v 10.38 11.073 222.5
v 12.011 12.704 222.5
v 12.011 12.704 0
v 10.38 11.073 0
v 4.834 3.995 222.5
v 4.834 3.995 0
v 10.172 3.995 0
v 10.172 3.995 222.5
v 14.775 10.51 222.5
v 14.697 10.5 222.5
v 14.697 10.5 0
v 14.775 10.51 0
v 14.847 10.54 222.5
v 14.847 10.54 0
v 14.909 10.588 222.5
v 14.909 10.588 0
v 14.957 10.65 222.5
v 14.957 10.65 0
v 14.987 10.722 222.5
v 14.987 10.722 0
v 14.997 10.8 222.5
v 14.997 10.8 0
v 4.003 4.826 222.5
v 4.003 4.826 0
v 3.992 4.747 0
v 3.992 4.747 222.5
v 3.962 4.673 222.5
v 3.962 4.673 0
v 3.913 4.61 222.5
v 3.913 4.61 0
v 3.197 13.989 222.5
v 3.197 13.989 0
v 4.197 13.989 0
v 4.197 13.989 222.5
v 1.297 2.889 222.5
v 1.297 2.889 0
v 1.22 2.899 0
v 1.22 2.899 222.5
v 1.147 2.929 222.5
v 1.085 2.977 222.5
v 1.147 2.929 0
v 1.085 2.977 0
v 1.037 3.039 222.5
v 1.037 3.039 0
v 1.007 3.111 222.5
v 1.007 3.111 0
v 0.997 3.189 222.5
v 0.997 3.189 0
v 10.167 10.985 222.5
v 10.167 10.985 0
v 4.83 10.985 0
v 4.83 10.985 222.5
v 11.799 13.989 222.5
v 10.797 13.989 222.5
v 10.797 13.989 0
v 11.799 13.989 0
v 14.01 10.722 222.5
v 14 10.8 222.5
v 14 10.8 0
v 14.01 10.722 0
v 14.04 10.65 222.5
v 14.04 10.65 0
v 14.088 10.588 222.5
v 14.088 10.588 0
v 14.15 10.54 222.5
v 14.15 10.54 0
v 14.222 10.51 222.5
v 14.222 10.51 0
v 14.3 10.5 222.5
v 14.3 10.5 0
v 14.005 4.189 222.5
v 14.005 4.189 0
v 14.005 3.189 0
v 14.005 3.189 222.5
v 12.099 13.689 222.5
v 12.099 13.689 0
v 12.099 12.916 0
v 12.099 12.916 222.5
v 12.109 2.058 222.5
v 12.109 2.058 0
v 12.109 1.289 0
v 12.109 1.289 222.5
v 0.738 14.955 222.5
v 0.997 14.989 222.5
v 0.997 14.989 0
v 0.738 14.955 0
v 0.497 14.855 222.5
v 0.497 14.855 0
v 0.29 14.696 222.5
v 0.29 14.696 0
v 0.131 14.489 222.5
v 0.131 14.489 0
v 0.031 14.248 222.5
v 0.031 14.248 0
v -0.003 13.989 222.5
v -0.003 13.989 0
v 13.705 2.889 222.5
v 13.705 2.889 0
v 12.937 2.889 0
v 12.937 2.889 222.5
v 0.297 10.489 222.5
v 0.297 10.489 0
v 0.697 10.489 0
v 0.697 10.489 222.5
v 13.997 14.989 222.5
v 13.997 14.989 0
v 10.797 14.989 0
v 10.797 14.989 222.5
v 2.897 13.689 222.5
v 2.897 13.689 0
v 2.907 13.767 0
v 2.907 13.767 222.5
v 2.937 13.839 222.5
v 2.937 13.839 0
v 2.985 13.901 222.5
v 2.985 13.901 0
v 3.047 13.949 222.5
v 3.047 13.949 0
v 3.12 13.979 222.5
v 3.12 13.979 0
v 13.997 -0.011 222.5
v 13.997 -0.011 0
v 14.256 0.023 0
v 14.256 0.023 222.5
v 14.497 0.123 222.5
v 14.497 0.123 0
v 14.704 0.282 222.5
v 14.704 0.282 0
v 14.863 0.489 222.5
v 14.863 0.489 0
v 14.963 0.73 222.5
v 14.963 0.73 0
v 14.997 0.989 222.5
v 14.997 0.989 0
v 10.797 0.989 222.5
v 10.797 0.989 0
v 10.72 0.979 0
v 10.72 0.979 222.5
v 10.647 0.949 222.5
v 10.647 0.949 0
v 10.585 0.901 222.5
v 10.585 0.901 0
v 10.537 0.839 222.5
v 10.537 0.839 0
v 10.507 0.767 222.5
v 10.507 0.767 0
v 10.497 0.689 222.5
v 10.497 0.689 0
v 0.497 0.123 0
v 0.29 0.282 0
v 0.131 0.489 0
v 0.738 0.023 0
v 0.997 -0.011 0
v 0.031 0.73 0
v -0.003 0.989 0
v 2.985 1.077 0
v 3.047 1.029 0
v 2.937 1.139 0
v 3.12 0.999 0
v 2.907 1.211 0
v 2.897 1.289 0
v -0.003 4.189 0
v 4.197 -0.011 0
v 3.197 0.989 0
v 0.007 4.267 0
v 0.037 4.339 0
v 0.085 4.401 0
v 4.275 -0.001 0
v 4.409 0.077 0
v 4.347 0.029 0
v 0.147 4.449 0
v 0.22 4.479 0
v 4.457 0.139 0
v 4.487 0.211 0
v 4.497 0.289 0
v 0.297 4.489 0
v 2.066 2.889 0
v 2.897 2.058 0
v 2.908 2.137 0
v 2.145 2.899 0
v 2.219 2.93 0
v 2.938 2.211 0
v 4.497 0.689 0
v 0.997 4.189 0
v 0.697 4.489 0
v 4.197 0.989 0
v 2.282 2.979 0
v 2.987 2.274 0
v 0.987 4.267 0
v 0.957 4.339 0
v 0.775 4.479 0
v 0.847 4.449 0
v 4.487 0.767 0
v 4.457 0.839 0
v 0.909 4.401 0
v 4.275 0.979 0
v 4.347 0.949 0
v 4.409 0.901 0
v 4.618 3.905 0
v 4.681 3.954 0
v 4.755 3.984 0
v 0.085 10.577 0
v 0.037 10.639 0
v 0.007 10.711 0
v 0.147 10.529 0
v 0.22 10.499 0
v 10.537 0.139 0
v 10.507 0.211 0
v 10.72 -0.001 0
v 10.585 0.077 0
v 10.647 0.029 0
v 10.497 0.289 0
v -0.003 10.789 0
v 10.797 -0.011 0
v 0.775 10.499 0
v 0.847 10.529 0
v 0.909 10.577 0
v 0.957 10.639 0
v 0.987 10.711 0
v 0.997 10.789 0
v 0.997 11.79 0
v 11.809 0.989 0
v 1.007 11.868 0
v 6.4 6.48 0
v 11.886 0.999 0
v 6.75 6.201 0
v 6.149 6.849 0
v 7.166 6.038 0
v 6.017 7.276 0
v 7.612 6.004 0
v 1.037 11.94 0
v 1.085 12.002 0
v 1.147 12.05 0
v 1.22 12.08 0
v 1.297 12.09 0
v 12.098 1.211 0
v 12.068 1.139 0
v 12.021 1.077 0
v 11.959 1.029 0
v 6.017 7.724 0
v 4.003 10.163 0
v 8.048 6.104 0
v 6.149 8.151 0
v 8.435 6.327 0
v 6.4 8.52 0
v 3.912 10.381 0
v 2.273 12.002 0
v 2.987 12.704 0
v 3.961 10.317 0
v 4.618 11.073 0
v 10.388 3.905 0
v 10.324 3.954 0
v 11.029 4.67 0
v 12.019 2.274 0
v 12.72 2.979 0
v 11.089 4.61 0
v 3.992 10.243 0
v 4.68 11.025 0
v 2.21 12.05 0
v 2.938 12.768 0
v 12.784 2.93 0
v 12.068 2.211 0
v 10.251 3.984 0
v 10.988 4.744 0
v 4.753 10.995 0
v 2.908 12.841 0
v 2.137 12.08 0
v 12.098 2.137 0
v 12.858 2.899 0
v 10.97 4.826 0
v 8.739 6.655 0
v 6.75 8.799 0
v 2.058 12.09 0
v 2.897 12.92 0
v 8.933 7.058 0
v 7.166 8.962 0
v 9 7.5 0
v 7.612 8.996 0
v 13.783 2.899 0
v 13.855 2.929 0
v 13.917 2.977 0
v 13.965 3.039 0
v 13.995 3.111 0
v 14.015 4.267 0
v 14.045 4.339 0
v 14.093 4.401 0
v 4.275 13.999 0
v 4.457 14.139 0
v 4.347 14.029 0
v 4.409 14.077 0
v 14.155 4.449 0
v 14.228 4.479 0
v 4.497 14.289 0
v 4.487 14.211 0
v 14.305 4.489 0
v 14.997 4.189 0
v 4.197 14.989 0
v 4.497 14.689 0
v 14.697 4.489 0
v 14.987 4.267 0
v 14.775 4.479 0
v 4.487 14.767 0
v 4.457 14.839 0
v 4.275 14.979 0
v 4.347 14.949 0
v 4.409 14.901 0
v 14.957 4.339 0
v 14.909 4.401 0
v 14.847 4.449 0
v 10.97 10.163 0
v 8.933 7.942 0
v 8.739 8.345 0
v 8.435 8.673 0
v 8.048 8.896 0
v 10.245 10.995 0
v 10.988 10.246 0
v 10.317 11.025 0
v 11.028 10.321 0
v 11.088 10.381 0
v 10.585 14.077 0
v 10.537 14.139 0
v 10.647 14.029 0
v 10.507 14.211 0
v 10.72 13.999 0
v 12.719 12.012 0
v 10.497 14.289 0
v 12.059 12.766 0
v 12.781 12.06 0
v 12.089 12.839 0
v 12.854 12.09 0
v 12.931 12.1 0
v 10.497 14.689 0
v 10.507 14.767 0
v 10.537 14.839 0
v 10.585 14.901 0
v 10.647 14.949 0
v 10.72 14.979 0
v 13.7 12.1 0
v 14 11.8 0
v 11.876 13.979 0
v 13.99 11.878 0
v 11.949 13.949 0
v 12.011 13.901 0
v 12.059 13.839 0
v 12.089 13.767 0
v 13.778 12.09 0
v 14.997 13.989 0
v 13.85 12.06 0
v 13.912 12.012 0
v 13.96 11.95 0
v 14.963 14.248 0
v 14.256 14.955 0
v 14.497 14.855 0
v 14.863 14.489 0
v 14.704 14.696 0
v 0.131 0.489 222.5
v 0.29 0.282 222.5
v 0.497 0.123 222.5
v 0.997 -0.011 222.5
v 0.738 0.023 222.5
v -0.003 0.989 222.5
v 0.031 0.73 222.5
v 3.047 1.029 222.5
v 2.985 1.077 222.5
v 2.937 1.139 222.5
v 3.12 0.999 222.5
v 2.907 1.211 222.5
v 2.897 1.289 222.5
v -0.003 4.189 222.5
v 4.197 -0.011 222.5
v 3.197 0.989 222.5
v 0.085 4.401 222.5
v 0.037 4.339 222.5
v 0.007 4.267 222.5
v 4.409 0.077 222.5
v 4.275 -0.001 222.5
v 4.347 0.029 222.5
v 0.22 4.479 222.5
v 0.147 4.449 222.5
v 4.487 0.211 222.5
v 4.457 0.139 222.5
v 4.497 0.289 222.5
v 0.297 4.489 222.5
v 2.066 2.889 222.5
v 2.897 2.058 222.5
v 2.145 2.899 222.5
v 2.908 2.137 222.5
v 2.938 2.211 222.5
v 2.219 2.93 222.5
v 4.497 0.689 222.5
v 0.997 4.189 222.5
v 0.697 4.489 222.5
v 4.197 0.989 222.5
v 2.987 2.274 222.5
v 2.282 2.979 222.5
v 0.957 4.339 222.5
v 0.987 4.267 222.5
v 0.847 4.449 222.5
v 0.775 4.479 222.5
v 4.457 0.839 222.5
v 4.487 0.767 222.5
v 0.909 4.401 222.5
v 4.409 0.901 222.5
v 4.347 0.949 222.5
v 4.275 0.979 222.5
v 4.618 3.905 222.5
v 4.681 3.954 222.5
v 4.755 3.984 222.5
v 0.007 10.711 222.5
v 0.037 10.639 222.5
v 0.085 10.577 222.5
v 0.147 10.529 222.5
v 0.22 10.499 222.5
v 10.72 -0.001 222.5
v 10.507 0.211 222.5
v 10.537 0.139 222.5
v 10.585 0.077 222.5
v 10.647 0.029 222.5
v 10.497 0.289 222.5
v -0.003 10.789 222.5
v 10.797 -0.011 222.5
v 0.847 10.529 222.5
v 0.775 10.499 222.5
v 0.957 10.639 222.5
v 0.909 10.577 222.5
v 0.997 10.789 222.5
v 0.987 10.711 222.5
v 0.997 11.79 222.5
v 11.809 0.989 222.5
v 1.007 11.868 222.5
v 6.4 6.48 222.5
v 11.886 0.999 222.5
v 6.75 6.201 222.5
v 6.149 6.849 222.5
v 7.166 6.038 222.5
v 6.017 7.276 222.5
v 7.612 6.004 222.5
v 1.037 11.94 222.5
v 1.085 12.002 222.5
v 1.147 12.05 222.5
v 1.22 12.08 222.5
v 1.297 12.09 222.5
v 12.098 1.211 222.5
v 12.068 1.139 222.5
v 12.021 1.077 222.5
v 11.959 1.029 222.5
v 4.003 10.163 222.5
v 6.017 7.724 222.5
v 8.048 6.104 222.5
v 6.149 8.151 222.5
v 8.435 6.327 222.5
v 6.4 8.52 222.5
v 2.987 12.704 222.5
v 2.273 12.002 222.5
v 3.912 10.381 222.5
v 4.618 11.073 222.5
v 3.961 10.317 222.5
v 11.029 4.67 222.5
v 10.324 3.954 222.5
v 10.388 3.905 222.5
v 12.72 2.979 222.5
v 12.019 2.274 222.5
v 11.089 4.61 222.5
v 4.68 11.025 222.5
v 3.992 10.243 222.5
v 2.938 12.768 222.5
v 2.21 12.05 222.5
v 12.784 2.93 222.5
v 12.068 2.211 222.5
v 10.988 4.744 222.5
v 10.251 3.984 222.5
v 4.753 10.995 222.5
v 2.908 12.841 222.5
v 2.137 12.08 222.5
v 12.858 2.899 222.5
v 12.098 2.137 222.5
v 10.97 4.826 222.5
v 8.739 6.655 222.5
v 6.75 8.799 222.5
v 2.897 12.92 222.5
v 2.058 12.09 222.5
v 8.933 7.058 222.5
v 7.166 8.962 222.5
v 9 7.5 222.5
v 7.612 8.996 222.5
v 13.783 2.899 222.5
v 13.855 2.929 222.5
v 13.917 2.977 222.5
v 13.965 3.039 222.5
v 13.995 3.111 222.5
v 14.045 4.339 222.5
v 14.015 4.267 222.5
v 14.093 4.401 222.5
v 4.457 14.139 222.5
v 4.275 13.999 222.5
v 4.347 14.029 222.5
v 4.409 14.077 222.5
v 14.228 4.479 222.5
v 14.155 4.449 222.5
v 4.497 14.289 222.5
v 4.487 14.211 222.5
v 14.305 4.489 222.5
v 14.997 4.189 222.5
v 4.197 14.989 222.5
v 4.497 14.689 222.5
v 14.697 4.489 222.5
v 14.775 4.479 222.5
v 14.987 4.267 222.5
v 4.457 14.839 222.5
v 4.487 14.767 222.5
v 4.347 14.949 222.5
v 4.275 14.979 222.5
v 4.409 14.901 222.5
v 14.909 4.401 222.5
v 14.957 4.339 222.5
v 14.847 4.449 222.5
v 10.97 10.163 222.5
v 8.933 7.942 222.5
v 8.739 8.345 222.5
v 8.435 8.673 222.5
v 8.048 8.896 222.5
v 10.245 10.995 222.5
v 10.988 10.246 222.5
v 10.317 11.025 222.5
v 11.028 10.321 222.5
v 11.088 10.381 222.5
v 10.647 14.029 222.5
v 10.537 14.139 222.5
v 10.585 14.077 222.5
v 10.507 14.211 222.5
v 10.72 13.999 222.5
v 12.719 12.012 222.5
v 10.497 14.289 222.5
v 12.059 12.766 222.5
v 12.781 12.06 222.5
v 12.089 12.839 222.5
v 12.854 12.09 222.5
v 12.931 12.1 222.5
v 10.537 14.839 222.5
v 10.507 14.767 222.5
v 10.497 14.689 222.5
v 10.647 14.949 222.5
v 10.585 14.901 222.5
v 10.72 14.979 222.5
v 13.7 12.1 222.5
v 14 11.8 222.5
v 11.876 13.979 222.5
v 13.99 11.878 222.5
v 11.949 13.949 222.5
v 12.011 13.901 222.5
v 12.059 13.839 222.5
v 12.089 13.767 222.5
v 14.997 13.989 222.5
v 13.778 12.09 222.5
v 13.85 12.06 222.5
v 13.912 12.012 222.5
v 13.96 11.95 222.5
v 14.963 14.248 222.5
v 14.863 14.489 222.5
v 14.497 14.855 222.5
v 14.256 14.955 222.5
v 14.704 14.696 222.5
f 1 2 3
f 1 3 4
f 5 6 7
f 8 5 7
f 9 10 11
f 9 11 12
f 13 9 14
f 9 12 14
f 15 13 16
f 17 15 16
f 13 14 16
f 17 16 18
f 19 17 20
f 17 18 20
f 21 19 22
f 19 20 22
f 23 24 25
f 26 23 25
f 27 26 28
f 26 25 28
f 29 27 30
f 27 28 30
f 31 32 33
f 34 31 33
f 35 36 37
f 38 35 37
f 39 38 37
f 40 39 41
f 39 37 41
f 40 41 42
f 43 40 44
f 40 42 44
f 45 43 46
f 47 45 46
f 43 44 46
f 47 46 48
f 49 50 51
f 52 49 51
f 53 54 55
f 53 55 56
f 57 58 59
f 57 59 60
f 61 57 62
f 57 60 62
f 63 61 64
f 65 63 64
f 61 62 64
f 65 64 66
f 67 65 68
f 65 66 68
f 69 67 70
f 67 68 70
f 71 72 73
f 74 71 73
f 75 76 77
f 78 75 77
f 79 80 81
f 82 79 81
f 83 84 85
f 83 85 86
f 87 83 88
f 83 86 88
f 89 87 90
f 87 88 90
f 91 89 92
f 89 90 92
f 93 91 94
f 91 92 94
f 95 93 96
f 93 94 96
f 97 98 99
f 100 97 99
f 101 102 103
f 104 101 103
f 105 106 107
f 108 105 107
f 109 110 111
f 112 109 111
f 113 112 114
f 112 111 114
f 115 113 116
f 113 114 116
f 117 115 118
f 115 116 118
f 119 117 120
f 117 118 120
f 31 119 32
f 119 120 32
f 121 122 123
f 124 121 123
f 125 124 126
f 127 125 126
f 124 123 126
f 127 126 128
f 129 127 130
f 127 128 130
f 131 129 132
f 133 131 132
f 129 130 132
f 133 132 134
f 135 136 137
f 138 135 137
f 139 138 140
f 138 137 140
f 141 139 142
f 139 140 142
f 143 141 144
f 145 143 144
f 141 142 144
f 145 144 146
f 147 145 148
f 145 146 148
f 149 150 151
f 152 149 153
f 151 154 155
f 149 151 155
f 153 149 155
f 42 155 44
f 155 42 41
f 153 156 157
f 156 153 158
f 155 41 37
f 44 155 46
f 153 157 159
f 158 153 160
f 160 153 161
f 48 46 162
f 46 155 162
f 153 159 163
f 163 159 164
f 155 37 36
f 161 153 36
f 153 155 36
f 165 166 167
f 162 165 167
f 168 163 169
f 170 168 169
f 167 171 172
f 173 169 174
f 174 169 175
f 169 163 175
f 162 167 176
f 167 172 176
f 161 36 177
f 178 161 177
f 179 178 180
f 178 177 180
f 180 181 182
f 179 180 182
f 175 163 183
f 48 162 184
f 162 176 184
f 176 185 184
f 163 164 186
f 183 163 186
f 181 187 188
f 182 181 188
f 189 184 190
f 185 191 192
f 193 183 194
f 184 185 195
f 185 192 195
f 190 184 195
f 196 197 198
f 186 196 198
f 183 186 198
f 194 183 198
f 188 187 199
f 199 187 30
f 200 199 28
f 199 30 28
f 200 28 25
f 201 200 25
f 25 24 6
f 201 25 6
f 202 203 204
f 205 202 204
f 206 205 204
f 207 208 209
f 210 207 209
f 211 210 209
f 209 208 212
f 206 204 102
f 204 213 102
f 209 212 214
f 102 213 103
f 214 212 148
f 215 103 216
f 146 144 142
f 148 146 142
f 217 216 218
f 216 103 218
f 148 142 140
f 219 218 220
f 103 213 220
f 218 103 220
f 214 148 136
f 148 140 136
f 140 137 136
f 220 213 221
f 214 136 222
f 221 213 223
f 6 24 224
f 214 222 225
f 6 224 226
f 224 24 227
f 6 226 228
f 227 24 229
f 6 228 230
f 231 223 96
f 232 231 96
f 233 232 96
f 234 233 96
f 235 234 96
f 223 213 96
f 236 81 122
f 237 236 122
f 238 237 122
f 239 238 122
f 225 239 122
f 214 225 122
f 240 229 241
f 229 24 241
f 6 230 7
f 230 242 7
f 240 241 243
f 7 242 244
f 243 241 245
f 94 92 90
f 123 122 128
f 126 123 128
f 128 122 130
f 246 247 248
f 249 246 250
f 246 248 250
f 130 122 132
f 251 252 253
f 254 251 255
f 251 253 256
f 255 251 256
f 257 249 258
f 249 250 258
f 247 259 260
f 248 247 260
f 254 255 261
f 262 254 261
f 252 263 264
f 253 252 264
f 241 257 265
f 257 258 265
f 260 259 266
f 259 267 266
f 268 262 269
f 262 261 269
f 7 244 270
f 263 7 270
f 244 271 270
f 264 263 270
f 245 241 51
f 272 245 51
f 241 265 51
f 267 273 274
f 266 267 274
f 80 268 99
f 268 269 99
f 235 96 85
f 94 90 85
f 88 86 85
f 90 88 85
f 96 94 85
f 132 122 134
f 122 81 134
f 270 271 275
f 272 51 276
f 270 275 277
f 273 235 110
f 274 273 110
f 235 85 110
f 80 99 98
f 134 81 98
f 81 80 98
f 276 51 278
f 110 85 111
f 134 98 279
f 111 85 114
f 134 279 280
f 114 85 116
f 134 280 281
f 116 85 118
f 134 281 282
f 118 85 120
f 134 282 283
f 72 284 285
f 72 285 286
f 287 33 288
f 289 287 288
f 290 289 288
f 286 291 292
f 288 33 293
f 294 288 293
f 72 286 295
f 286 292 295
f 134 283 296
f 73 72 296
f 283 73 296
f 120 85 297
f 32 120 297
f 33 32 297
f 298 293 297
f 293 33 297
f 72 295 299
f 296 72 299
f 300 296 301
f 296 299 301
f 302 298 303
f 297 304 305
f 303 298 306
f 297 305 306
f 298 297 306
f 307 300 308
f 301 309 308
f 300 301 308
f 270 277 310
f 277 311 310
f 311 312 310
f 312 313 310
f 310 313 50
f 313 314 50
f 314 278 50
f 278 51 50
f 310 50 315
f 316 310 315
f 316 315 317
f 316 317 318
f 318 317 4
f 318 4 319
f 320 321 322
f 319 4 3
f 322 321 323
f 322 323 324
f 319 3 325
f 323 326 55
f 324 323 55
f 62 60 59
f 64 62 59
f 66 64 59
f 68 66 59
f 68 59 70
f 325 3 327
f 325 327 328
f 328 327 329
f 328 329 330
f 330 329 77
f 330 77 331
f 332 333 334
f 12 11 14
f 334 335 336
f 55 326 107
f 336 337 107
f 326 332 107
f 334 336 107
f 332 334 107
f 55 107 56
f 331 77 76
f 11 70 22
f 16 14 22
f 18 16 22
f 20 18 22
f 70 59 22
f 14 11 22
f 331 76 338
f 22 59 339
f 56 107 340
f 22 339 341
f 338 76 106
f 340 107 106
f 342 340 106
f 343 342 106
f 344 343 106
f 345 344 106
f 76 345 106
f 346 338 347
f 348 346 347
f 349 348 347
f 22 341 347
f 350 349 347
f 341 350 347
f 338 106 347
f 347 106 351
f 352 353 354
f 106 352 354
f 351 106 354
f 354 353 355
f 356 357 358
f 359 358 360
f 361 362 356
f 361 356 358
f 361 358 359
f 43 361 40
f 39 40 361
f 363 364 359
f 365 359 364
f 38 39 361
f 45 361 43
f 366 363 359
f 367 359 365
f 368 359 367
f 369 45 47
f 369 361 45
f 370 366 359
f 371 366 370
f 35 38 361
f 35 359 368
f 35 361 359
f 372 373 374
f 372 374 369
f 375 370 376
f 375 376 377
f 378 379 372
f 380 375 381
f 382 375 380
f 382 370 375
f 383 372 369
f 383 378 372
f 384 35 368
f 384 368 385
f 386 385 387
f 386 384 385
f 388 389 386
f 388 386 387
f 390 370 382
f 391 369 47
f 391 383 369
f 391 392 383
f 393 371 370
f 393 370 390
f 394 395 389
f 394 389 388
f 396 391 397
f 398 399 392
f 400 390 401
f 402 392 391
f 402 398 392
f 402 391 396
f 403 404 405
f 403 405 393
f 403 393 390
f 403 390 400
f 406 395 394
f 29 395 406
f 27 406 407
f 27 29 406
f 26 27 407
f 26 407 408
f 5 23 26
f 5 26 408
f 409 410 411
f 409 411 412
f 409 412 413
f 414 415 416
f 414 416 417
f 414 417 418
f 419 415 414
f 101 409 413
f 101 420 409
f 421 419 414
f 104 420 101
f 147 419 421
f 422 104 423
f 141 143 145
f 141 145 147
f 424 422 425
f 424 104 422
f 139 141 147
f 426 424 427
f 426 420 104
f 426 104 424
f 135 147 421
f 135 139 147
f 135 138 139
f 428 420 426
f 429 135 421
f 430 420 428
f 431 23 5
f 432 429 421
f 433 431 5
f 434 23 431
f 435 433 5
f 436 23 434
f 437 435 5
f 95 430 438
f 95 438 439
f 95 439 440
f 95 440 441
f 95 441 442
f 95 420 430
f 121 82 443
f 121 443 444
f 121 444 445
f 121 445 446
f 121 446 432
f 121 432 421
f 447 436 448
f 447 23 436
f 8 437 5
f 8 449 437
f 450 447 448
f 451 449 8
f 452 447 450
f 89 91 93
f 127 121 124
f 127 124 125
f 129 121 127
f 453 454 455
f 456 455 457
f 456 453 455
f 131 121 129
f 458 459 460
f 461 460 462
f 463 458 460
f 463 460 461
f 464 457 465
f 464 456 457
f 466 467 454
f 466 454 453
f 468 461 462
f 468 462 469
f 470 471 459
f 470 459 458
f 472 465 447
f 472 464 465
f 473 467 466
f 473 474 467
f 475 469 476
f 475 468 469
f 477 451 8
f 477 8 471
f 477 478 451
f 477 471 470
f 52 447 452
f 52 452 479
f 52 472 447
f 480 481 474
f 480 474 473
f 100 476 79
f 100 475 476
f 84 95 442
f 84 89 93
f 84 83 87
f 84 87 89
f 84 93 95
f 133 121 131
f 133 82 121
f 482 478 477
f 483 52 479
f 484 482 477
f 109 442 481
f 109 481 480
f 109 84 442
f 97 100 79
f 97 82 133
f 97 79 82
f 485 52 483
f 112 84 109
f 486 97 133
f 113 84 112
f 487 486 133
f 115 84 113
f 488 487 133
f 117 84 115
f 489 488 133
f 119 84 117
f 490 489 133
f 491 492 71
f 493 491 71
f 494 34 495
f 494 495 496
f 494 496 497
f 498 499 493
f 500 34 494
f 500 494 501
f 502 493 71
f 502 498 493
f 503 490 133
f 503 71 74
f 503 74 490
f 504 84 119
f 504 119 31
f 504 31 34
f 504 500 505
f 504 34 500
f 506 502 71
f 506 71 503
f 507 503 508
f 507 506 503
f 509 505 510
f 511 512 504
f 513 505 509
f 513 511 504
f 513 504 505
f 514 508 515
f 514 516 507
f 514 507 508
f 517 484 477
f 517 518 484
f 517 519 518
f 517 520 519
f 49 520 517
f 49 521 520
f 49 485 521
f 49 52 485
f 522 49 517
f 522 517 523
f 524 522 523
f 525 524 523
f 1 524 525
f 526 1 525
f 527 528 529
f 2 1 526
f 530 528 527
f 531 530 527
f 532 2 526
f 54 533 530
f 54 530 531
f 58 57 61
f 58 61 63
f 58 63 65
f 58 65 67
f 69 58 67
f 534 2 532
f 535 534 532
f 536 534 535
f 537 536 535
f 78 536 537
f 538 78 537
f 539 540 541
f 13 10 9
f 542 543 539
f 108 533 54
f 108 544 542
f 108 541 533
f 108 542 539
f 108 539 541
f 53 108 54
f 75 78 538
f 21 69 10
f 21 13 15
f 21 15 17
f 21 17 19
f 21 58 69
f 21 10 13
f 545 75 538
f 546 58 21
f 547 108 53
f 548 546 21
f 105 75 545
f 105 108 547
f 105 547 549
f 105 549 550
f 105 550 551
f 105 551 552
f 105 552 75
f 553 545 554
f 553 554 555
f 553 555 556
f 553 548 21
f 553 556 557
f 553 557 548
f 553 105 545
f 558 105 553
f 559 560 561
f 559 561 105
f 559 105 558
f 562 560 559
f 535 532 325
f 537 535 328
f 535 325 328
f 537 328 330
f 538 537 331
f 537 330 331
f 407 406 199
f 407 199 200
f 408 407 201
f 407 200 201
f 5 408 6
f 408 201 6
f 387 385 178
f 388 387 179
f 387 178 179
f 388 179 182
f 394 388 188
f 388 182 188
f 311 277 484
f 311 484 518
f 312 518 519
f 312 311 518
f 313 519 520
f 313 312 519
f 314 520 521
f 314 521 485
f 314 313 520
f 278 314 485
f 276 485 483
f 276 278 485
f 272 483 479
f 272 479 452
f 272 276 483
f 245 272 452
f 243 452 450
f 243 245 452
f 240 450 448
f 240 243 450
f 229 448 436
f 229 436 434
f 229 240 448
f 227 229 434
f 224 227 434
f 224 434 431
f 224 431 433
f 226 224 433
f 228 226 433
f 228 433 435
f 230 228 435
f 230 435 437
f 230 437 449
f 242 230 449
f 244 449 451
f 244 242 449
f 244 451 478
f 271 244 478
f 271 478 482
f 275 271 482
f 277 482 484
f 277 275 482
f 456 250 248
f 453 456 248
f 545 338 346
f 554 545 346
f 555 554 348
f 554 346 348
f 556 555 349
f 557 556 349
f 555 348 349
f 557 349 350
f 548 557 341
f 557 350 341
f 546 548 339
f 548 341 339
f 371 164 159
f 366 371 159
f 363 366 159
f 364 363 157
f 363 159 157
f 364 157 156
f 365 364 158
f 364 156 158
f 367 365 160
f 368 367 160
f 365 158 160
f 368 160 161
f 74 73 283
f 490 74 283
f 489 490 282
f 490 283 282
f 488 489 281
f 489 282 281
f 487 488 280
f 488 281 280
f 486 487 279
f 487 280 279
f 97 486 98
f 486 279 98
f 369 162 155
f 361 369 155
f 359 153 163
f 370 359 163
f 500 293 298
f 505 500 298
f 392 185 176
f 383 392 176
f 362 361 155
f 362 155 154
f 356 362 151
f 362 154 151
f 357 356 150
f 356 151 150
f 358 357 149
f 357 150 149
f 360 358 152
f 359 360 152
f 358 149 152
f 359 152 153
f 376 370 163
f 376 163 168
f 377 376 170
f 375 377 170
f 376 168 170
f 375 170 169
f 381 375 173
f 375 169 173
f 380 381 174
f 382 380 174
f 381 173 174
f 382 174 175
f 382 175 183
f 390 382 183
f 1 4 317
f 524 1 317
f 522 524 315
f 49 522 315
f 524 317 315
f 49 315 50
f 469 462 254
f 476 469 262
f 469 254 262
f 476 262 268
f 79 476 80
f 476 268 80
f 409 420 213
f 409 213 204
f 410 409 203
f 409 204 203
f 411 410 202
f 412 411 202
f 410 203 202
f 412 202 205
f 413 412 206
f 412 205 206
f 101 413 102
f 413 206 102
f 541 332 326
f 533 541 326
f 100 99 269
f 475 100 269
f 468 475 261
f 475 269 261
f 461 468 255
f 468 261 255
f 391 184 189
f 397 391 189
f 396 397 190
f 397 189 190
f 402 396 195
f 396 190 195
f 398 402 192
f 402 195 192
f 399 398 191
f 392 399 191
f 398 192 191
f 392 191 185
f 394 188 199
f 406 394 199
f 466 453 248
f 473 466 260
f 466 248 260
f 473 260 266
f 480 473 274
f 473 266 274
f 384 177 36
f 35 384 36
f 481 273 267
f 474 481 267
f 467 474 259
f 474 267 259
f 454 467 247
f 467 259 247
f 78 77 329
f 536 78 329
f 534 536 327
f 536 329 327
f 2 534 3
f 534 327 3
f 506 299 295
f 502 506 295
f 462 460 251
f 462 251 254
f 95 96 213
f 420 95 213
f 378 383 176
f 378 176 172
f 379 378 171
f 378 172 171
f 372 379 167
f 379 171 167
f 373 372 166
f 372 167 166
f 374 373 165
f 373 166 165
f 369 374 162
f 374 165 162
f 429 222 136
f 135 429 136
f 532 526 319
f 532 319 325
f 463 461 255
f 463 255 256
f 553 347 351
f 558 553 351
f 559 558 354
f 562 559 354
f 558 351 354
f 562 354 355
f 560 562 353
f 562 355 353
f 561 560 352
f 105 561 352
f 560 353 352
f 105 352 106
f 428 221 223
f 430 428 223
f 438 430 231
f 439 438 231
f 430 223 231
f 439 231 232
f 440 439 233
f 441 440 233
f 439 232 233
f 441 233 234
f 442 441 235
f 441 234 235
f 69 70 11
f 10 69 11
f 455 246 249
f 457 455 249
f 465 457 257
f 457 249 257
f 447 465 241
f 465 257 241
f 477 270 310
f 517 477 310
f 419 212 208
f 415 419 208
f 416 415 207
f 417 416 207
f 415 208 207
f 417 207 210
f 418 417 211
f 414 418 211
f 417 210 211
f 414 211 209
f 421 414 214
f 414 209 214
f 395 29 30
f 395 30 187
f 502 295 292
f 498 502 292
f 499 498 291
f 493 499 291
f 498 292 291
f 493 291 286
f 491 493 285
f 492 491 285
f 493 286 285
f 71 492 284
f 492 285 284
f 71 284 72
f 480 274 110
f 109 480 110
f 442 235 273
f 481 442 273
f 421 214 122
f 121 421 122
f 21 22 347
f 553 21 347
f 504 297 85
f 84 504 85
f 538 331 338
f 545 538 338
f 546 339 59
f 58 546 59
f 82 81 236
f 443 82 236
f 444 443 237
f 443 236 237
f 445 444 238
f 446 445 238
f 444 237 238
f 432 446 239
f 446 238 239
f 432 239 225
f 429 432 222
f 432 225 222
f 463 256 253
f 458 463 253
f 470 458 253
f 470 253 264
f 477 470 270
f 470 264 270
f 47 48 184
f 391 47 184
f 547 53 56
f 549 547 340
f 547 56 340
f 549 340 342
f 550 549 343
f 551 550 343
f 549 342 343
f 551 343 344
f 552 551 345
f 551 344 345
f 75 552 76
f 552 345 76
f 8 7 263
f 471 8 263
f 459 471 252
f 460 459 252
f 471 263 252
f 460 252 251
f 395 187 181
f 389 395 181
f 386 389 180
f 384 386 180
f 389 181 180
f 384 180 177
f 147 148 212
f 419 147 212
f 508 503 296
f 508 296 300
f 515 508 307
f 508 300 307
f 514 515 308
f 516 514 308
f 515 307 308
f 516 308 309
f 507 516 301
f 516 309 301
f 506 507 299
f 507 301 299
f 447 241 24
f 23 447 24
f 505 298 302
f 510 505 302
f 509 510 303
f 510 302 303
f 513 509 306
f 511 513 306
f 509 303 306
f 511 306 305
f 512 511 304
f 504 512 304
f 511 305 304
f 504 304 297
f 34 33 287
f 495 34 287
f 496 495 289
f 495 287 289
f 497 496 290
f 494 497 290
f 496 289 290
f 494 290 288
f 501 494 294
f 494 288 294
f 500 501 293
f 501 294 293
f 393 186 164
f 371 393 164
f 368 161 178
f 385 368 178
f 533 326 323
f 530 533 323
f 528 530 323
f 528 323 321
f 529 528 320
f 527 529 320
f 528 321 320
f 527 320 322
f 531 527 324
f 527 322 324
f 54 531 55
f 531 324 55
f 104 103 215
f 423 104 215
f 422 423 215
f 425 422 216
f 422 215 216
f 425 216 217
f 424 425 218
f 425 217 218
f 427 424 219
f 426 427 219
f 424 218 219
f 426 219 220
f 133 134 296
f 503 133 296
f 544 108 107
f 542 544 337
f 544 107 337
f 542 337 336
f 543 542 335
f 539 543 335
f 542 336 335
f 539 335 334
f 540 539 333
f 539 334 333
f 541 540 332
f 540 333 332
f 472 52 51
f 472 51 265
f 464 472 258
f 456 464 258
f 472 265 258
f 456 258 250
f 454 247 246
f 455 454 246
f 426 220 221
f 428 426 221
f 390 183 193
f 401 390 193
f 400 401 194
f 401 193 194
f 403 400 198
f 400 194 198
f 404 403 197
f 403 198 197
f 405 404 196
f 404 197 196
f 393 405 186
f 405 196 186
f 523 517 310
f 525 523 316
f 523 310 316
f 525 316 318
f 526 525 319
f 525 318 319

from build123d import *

# Parameters (mm, degrees)
SKETCH1_R           = 1.5
BOSS_EXTRUDE1_DEPTH = 222.5


with BuildPart() as part:
    # Sketch1 → Boss-Extrude1 (new body)
    with BuildSketch(Plane.XY):
        with BuildLine():
            Line((0.997149379, -0.010991612), (4.197149379, -0.010991612))
            ThreePointArc((4.197149379, -0.010991612), (4.409281413, 0.076876353), (4.497149379, 0.289008388))
            Line((4.497149379, 0.289008388), (4.497149379, 0.689008388))
            ThreePointArc((4.497149379, 0.689008388), (4.409281413, 0.901140422), (4.197149379, 0.989008388))
            Line((4.197149379, 0.989008388), (3.197149379, 0.989008388))
            ThreePointArc((3.197149379, 0.989008388), (2.985017344, 1.076876353), (2.897149379, 1.289008388))
            Line((2.897149379, 1.289008388), (2.897149379, 2.057637538))
            ThreePointArc((2.897149379, 2.057637538), (2.920422177, 2.174637797), (2.9866975, 2.273825827))
            Line((2.9866975, 2.273825827), (4.61806835, 3.905196677))
            ThreePointArc((4.61806835, 3.905196677), (4.71725638, 3.971472), (4.834256639, 3.994744798))
            Line((4.834256639, 3.994744798), (10.171514939, 3.994744798))
            ThreePointArc((10.171514939, 3.994744798), (10.288515198, 3.971472), (10.387703228, 3.905196677))
            Line((10.387703228, 3.905196677), (12.019074078, 2.273825827))
            ThreePointArc((12.019074078, 2.273825827), (12.085349401, 2.174637797), (12.1086222, 2.057637538))
            Line((12.1086222, 2.057637538), (12.1086222, 1.289008388))
            ThreePointArc((12.1086222, 1.289008388), (12.020754234, 1.076876353), (11.8086222, 0.989008388))
            Line((11.8086222, 0.989008388), (10.797149379, 0.989008388))
            ThreePointArc((10.797149379, 0.989008388), (10.585017344, 0.901140422), (10.497149379, 0.689008388))
            Line((10.497149379, 0.689008388), (10.497149379, 0.289008388))
            ThreePointArc((10.497149379, 0.289008388), (10.585017344, 0.076876353), (10.797149379, -0.010991612))
            Line((10.797149379, -0.010991612), (13.997149379, -0.010991612))
            ThreePointArc((13.997149379, -0.010991612), (14.70425616, 0.281901607), (14.997149379, 0.989008388))
            Line((14.997149379, 0.989008388), (14.997149379, 4.189008388))
            ThreePointArc((14.997149379, 4.189008388), (14.909281413, 4.401140422), (14.697149379, 4.489008388))
            Line((14.697149379, 4.489008388), (14.305261888, 4.489008388))
            ThreePointArc((14.305261888, 4.489008388), (14.093129854, 4.401140422), (14.005261888, 4.189008388))
            Line((14.005261888, 4.189008388), (14.005261888, 3.189008388))
            ThreePointArc((14.005261888, 3.189008388), (13.917393922, 2.976876353), (13.705261888, 2.889008388))
            Line((13.705261888, 2.889008388), (12.936632738, 2.889008388))
            ThreePointArc((12.936632738, 2.889008388), (12.819632479, 2.912281186), (12.720444449, 2.978556509))
            Line((12.720444449, 2.978556509), (11.089073599, 4.609927359))
            ThreePointArc((11.089073599, 4.609927359), (11.006246661, 4.70520219), (10.969948855, 4.826115648))
            Line((10.969948855, 4.826115648), (10.969948855, 10.163373948))
            ThreePointArc((10.969948855, 10.163373948), (11.00546556, 10.284783861), (11.087867966, 10.380761184))
            Line((11.087867966, 10.380761184), (12.719238816, 12.012132034))
            ThreePointArc((12.719238816, 12.012132034), (12.81656582, 12.07716386), (12.93137085, 12.1))
            Line((12.93137085, 12.1), (13.7, 12.1))
            ThreePointArc((13.7, 12.1), (13.912132034, 12.012132034), (14, 11.8))
            Line((14, 11.8), (14, 10.8))
            ThreePointArc((14, 10.8), (14.087867966, 10.587867966), (14.3, 10.5))
            Line((14.3, 10.5), (14.697149379, 10.5))
            ThreePointArc((14.697149379, 10.5), (14.909281413, 10.587867966), (14.997149379, 10.8))
            Line((14.997149379, 10.8), (14.997149379, 13.989008388))
            ThreePointArc((14.997149379, 13.989008388), (14.70425616, 14.696115169), (13.997149379, 14.989008388))
            Line((13.997149379, 14.989008388), (10.797149379, 14.989008388))
            ThreePointArc((10.797149379, 14.989008388), (10.585017344, 14.901140422), (10.497149379, 14.689008388))
            Line((10.497149379, 14.689008388), (10.497149379, 14.289008388))
            ThreePointArc((10.497149379, 14.289008388), (10.585017344, 14.076876353), (10.797149379, 13.989008388))
            Line((10.797149379, 13.989008388), (11.798829534, 13.989008388))
            ThreePointArc((11.798829534, 13.989008388), (12.010961569, 13.901140422), (12.098829534, 13.689008388))
            Line((12.098829534, 13.689008388), (12.098829534, 12.916322983))
            ThreePointArc((12.098829534, 12.916322983), (12.075993394, 12.801517953), (12.010961569, 12.704190949))
            Line((12.010961569, 12.704190949), (10.379590719, 11.072820099))
            ThreePointArc((10.379590719, 11.072820099), (10.282263714, 11.007788273), (10.167458684, 10.984952133))
            Line((10.167458684, 10.984952133), (4.830200384, 10.984952133))
            ThreePointArc((4.830200384, 10.984952133), (4.715395355, 11.007788273), (4.61806835, 11.072820099))
            Line((4.61806835, 11.072820099), (2.9866975, 12.704190949))
            ThreePointArc((2.9866975, 12.704190949), (2.920422177, 12.803378979), (2.897149379, 12.920379238))
            Line((2.897149379, 12.920379238), (2.897149379, 13.689008388))
            ThreePointArc((2.897149379, 13.689008388), (2.985017344, 13.901140422), (3.197149379, 13.989008388))
            Line((3.197149379, 13.989008388), (4.197149379, 13.989008388))
            ThreePointArc((4.197149379, 13.989008388), (4.409281413, 14.076876353), (4.497149379, 14.289008388))
            Line((4.497149379, 14.289008388), (4.497149379, 14.689008388))
            ThreePointArc((4.497149379, 14.689008388), (4.409281413, 14.901140422), (4.197149379, 14.989008388))
            Line((4.197149379, 14.989008388), (0.997149379, 14.989008388))
            ThreePointArc((0.997149379, 14.989008388), (0.290042597, 14.696115169), (-0.002850621, 13.989008388))
            Line((-0.002850621, 13.989008388), (-0.002850621, 10.789008388))
            ThreePointArc((-0.002850621, 10.789008388), (0.085017344, 10.576876353), (0.297149379, 10.489008388))
            Line((0.297149379, 10.489008388), (0.697149379, 10.489008388))
            ThreePointArc((0.697149379, 10.489008388), (0.909281413, 10.576876353), (0.997149379, 10.789008388))
            Line((0.997149379, 10.789008388), (0.997149379, 11.790199043))
            ThreePointArc((0.997149379, 11.790199043), (1.085017344, 12.002331078), (1.297149379, 12.090199043))
            Line((1.297149379, 12.090199043), (2.057928823, 12.090199043))
            ThreePointArc((2.057928823, 12.090199043), (2.174143192, 12.067250491), (2.272911478, 12.001849869))
            Line((2.272911478, 12.001849869), (3.912132034, 10.380761184))
            ThreePointArc((3.912132034, 10.380761184), (3.97928656, 10.281159192), (4.002885789, 10.163373948))
            Line((4.002885789, 10.163373948), (4.002885789, 4.826115648))
            ThreePointArc((4.002885789, 4.826115648), (3.979612991, 4.709115389), (3.913337668, 4.609927359))
            Line((3.913337668, 4.609927359), (2.281966818, 2.978556509))
            ThreePointArc((2.281966818, 2.978556509), (2.182778788, 2.912281186), (2.065778529, 2.889008388))
            Line((2.065778529, 2.889008388), (1.297149379, 2.889008388))
            ThreePointArc((1.297149379, 2.889008388), (1.085017344, 2.976876353), (0.997149379, 3.189008388))
            Line((0.997149379, 3.189008388), (0.997149379, 4.189008388))
            ThreePointArc((0.997149379, 4.189008388), (0.909281413, 4.401140422), (0.697149379, 4.489008388))
            Line((0.697149379, 4.489008388), (0.297149379, 4.489008388))
            ThreePointArc((0.297149379, 4.489008388), (0.085017344, 4.401140422), (-0.002850621, 4.189008388))
            Line((-0.002850621, 4.189008388), (-0.002850621, 0.989008388))
            ThreePointArc((-0.002850621, 0.989008388), (0.290042597, 0.281901607), (0.997149379, -0.010991612))
        make_face()
        with Locations((7.5, 7.5)):
            Circle(SKETCH1_R, mode=Mode.SUBTRACT)
    extrude(amount=BOSS_EXTRUDE1_DEPTH)


solid = part.part
